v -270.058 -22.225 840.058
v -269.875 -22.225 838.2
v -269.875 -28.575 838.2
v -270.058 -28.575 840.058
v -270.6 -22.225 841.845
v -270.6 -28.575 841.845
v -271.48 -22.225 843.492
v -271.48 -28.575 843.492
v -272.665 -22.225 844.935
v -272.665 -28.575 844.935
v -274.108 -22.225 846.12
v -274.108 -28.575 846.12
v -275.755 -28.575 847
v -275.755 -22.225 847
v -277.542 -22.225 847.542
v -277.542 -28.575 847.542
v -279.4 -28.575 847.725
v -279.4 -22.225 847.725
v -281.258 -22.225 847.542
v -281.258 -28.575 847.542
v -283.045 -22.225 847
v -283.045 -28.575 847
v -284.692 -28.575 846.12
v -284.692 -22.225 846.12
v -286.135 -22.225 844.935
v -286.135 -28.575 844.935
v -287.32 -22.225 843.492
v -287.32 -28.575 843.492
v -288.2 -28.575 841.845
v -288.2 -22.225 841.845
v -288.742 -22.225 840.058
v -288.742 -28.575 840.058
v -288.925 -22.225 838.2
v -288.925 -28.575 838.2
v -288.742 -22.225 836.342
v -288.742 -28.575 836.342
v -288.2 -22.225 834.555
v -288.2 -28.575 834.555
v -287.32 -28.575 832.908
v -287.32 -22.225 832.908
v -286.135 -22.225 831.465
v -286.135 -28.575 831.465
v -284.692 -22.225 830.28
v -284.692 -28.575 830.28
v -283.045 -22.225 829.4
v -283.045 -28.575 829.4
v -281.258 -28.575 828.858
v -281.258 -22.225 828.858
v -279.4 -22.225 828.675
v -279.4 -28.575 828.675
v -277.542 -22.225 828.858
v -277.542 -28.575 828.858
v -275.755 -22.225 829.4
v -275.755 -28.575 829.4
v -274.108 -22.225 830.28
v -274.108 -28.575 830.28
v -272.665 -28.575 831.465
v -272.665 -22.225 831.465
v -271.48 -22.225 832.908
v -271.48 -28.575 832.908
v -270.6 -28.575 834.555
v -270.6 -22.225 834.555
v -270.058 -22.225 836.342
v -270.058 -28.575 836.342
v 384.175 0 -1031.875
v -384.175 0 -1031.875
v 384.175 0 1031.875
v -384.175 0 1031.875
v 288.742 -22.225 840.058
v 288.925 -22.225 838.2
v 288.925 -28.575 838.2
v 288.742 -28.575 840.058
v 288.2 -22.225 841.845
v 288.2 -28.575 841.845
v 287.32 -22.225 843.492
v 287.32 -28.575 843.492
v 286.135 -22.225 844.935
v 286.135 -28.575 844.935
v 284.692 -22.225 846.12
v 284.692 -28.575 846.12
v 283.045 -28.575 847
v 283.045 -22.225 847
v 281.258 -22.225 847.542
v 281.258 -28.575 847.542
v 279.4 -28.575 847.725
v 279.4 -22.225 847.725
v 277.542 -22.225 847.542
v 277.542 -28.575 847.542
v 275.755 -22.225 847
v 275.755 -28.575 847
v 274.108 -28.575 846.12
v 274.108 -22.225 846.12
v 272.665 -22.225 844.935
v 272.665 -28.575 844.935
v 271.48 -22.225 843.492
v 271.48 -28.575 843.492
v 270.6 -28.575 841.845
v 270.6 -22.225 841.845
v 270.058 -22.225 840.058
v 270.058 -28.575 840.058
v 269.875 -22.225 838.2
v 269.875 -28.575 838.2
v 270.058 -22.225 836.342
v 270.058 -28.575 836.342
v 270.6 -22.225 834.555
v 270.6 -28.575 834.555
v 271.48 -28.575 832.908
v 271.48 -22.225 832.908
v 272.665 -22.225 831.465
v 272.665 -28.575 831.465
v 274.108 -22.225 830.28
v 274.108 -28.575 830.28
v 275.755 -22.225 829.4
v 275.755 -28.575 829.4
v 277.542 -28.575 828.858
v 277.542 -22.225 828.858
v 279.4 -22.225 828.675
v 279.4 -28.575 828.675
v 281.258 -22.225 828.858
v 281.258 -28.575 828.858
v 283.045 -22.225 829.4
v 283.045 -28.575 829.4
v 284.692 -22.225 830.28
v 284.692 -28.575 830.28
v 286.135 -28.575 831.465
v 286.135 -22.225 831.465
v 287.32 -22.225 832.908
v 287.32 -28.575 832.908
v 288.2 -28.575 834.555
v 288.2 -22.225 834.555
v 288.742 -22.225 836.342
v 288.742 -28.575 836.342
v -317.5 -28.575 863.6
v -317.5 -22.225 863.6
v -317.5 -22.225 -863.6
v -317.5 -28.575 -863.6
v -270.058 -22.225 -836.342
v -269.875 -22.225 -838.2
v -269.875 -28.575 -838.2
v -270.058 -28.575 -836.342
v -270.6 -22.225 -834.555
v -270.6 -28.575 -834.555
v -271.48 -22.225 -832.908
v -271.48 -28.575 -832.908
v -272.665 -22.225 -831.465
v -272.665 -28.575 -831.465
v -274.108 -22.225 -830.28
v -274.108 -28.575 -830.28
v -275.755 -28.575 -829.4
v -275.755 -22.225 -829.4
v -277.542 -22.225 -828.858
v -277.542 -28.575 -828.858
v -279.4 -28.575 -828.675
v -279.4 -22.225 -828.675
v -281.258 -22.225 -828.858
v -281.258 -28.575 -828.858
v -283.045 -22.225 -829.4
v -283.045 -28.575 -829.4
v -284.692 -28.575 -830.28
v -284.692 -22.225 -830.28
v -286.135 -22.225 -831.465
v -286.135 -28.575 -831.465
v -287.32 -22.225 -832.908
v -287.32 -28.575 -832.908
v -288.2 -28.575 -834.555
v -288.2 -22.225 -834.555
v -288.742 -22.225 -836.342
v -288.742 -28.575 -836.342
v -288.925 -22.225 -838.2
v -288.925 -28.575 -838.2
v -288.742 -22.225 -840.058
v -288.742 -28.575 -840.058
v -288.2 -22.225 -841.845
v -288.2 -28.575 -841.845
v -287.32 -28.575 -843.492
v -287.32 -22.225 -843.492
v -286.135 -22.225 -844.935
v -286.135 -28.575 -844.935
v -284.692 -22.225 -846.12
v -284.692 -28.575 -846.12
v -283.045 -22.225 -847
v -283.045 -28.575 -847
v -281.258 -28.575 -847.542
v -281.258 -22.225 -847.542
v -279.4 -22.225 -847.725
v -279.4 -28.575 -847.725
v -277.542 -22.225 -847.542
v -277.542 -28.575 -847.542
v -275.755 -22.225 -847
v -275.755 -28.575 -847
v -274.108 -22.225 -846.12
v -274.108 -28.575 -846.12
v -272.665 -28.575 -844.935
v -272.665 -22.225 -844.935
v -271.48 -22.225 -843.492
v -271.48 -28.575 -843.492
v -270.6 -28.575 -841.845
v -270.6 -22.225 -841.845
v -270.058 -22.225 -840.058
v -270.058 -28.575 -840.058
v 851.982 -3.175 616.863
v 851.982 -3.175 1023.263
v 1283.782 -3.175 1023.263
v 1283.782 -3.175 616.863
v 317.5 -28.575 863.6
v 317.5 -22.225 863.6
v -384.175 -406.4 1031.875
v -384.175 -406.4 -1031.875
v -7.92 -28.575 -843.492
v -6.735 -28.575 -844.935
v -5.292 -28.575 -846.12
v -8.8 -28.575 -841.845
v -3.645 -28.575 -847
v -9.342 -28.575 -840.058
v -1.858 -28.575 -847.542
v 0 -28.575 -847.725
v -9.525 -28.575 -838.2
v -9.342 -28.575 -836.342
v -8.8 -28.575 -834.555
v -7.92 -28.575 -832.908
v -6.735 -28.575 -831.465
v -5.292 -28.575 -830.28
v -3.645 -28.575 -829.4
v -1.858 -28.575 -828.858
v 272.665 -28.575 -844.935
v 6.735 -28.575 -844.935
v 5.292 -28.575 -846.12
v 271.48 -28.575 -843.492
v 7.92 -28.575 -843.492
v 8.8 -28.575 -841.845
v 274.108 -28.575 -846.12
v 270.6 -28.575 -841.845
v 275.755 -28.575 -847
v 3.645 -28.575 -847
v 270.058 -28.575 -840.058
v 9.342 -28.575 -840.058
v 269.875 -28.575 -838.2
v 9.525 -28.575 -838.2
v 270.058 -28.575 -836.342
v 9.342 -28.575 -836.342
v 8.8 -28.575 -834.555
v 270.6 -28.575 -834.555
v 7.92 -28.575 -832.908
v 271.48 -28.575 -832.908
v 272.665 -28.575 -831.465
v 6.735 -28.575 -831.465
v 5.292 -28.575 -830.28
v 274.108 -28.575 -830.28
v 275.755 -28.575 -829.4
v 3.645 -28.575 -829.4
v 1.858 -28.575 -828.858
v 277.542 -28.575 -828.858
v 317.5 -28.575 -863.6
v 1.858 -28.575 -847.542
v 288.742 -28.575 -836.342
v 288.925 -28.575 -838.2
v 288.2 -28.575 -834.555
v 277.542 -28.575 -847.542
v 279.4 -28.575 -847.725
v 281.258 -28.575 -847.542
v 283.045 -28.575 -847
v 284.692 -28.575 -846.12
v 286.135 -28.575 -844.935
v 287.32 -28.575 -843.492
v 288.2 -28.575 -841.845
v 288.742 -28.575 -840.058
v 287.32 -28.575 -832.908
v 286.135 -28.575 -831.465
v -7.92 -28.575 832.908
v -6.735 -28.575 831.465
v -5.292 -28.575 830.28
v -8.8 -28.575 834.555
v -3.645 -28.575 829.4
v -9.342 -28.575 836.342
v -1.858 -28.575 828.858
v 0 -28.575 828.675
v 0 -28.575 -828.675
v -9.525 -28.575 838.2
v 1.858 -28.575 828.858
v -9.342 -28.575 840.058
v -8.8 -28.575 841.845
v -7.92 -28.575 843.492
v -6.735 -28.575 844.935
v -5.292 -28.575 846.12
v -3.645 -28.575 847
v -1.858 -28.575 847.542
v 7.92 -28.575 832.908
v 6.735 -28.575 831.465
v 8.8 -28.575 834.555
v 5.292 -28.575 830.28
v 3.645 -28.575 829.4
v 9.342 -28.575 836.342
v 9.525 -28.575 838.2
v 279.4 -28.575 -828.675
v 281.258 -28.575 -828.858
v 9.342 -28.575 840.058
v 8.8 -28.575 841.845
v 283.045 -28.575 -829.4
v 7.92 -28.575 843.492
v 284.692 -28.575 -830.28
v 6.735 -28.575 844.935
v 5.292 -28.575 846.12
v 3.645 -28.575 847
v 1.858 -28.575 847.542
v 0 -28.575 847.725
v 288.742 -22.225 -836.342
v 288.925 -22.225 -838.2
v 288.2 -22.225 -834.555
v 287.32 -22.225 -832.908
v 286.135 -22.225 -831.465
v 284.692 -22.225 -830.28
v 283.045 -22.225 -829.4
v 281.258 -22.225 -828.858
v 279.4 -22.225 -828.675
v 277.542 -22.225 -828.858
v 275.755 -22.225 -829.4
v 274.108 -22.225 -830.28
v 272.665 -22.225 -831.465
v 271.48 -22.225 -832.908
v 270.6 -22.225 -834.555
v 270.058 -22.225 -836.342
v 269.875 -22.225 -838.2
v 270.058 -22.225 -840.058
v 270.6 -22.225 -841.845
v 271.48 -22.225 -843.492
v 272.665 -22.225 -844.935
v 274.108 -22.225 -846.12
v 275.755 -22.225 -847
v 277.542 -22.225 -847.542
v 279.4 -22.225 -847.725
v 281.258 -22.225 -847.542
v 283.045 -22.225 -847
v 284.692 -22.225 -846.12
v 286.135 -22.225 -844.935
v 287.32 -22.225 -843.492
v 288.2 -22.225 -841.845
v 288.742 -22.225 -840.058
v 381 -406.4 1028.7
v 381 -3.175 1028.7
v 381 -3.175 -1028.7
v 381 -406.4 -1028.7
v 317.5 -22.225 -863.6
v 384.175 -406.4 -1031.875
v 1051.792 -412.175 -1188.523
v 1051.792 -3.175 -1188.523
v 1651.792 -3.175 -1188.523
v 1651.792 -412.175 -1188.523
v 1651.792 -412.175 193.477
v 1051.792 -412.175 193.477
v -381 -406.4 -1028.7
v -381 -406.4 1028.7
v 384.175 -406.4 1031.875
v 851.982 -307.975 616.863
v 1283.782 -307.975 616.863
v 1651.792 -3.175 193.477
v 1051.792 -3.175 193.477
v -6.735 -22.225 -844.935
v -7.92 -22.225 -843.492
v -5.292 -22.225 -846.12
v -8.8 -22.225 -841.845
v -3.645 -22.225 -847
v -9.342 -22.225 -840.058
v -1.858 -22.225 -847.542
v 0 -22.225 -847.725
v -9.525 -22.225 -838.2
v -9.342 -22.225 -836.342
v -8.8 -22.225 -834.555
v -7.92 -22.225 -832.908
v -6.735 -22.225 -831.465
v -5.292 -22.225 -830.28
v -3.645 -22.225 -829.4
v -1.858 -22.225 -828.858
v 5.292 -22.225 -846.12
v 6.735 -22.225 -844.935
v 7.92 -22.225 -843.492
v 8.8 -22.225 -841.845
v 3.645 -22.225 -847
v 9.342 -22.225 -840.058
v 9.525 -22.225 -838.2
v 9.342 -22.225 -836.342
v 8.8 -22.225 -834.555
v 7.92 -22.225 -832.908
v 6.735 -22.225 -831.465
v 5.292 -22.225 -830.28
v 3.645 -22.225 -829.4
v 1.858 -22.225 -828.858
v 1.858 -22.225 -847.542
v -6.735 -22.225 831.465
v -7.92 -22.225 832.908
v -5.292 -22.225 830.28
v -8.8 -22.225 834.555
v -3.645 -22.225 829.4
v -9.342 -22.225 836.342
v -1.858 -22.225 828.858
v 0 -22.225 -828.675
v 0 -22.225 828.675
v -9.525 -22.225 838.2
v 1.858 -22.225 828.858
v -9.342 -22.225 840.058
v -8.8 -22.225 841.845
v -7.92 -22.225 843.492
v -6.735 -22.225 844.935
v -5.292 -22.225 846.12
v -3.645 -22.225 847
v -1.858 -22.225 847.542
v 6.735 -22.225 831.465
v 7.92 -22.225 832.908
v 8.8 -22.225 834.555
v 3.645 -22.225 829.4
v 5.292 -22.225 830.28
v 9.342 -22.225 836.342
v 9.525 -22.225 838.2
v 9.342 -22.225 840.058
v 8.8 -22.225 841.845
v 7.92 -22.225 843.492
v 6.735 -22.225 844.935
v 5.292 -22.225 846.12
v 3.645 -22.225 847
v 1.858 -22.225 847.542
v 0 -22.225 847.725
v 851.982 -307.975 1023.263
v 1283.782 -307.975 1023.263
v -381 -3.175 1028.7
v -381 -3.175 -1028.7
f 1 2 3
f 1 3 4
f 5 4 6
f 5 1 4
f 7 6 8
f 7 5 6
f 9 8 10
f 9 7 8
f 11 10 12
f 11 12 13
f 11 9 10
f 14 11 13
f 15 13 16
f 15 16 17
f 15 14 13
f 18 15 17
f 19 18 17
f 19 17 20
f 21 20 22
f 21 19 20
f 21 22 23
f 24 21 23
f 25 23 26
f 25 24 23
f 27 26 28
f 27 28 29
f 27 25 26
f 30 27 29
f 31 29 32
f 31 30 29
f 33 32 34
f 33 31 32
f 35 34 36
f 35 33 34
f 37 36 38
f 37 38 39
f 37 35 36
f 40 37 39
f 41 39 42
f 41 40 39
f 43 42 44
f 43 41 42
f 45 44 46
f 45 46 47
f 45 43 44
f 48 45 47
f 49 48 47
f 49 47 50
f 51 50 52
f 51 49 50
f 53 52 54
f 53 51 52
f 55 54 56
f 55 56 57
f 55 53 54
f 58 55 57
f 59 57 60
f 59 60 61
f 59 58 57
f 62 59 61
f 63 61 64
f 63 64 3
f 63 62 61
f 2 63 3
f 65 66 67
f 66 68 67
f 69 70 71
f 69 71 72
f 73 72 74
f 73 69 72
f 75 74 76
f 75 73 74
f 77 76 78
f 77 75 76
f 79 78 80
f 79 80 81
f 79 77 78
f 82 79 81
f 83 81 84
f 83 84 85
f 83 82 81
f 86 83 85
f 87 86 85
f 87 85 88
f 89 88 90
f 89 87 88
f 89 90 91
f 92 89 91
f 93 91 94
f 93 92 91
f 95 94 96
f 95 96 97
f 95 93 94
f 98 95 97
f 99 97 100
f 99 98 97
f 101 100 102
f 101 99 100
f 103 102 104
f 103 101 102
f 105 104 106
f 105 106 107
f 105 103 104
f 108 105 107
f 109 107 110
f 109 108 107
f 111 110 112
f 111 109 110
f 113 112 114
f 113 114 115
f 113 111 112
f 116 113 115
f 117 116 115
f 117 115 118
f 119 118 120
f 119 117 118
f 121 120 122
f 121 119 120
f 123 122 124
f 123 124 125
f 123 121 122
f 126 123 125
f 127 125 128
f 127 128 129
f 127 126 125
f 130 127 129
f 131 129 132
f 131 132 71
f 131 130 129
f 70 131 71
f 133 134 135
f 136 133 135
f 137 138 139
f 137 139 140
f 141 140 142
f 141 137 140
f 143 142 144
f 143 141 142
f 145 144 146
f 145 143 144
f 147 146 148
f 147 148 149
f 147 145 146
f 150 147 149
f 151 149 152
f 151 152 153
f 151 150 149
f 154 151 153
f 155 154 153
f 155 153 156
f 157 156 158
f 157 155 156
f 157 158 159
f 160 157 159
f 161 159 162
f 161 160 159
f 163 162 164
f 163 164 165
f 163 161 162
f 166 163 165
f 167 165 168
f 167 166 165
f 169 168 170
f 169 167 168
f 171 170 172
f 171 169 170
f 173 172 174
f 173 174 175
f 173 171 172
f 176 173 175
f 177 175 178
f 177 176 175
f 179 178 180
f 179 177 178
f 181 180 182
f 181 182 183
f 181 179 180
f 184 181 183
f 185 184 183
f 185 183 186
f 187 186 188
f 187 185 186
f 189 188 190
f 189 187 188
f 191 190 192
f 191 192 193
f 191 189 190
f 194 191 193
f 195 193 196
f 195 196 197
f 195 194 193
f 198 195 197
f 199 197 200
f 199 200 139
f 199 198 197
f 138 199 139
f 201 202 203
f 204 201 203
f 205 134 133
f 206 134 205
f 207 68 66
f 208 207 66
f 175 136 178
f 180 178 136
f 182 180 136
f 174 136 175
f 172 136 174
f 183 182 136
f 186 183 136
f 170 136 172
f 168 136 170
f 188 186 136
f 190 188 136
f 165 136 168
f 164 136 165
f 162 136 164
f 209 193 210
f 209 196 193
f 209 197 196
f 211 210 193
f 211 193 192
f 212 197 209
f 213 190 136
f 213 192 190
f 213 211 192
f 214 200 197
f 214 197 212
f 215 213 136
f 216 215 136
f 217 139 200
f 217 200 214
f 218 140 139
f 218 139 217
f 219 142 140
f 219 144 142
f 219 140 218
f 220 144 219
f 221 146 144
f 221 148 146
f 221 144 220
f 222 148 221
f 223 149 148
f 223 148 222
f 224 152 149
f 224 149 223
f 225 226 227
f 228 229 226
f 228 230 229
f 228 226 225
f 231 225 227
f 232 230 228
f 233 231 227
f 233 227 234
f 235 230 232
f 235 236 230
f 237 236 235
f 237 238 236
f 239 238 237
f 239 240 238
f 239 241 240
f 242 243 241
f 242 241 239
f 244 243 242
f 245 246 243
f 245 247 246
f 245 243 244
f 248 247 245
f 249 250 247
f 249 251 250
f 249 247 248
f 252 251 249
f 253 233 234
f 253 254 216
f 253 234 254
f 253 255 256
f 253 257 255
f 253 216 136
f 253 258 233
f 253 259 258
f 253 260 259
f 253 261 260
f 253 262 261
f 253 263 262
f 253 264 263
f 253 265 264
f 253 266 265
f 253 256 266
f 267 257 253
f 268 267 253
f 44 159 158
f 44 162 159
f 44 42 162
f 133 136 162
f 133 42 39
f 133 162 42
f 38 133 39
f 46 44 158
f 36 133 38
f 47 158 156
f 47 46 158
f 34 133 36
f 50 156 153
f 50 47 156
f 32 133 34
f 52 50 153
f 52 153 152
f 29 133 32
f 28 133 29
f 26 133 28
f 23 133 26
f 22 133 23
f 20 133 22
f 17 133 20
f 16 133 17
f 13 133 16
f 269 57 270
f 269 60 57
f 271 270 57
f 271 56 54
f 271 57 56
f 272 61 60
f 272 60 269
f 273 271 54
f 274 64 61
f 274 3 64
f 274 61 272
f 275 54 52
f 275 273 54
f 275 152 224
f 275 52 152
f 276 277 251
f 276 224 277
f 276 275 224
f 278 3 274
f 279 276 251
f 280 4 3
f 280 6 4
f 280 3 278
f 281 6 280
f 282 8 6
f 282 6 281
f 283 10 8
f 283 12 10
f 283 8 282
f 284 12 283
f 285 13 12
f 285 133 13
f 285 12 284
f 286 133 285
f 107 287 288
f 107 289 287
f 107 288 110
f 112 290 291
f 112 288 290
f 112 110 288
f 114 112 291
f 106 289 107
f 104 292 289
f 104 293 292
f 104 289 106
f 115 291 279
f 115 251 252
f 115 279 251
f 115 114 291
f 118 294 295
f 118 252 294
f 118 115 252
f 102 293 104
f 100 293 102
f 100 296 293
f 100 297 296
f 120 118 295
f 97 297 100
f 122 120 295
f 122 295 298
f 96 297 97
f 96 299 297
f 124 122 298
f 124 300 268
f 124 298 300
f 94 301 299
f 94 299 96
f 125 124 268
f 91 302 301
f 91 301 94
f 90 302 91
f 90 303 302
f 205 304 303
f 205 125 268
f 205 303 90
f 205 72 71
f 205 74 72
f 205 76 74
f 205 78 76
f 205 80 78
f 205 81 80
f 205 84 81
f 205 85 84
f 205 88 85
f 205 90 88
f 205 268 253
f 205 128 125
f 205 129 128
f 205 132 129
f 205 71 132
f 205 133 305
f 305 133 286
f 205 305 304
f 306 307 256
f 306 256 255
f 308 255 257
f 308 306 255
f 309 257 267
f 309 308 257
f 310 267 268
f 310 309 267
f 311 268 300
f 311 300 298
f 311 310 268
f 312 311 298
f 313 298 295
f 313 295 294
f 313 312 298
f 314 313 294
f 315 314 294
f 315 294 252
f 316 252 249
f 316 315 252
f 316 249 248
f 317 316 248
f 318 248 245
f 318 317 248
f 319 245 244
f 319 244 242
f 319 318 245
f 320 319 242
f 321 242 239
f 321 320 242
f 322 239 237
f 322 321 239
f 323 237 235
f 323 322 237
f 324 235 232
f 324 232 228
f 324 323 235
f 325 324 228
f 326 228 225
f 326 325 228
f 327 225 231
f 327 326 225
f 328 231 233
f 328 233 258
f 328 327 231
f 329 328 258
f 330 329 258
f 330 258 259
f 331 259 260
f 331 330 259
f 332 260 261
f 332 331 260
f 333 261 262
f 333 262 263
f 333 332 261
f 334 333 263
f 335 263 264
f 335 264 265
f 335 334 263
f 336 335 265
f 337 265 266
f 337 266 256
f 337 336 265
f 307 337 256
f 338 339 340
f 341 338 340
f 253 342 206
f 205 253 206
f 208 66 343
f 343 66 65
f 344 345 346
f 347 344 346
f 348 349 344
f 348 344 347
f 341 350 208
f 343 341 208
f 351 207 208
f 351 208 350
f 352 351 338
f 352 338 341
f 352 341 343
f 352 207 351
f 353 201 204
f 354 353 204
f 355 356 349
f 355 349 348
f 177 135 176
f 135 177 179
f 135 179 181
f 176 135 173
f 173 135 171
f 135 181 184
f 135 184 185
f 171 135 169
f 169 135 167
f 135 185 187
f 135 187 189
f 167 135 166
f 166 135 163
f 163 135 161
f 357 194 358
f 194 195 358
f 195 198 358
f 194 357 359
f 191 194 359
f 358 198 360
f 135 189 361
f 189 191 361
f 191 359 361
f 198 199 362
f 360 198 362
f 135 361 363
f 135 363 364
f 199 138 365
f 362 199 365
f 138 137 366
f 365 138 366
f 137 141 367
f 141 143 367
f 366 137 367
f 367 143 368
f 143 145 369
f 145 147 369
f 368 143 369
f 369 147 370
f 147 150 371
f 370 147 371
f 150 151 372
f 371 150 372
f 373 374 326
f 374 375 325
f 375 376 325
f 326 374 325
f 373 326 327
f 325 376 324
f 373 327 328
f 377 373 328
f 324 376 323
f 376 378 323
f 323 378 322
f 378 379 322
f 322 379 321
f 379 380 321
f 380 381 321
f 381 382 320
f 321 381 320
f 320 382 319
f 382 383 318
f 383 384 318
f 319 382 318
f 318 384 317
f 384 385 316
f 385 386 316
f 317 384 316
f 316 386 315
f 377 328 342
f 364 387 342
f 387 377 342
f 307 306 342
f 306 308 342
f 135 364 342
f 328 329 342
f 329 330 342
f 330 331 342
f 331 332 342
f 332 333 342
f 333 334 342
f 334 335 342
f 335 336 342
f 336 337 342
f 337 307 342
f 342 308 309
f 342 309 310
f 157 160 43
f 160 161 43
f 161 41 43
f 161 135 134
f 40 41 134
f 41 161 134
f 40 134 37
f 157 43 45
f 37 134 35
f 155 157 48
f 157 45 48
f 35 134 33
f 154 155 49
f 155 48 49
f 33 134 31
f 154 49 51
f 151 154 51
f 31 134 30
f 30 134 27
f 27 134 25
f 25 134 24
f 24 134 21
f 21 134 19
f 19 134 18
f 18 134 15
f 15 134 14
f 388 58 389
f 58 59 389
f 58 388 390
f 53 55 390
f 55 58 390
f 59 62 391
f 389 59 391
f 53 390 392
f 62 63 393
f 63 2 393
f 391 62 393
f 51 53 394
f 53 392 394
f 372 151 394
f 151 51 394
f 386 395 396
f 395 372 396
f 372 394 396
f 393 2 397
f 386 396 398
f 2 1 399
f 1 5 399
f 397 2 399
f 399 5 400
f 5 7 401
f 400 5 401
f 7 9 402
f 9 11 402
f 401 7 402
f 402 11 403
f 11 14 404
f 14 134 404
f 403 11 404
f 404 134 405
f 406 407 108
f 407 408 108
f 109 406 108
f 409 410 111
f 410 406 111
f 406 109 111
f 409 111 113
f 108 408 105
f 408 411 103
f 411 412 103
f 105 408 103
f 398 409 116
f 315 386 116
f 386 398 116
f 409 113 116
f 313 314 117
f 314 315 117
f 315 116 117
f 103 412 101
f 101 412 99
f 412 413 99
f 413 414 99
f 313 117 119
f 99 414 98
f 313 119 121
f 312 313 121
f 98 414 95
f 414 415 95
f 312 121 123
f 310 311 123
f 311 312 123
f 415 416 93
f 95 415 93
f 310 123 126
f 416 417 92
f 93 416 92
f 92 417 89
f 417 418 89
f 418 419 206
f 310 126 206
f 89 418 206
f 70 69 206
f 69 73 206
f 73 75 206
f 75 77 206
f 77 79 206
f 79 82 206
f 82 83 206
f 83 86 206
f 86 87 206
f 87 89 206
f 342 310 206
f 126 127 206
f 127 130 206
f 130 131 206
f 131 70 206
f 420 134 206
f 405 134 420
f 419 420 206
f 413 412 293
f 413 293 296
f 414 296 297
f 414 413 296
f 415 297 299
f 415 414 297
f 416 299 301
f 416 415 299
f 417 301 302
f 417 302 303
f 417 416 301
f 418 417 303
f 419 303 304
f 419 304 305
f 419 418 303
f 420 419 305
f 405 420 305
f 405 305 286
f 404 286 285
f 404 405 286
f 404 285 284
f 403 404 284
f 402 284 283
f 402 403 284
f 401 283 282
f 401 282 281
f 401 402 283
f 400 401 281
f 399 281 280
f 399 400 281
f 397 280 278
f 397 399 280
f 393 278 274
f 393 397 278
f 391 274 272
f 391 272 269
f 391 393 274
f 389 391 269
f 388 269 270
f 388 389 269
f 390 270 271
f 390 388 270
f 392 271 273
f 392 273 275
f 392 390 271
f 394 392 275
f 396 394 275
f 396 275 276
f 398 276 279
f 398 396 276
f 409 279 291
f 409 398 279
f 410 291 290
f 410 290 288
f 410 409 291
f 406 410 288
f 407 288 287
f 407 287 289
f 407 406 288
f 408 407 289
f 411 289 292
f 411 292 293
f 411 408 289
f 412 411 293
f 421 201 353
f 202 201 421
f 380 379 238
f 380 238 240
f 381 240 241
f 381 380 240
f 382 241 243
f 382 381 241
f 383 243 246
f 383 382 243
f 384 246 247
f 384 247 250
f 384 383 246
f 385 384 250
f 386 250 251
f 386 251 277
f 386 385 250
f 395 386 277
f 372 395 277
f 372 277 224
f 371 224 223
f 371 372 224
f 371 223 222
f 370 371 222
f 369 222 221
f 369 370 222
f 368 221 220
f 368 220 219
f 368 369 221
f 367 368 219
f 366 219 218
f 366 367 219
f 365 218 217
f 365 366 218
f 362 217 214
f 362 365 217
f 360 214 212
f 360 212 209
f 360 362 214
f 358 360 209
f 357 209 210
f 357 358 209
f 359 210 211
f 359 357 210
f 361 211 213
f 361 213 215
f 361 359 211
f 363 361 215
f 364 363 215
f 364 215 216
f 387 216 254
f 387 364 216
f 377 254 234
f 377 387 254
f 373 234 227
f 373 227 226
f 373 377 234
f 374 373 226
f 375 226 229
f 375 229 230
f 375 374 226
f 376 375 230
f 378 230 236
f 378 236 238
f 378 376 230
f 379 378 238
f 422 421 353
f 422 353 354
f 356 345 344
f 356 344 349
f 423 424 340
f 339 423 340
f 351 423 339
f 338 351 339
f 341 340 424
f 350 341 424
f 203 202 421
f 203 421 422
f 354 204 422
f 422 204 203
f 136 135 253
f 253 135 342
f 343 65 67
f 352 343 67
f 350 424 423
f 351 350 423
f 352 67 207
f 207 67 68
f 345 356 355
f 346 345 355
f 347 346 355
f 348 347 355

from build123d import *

# Parameters (mm, degrees)
F0_W     = 762
F0_H     = 3.175
F0_H_2   = 2057.4
F1_DEPTH = 3.175
F2_DEPTH = 406.4
F4_START = 19.05
F3_W     = 635
F3_H     = 101.6
F3_R     = 9.525
F3_H_2   = 1562.1
F3_H_3   = 63.5
F4_DEPTH = 6.35
F3_W_2   = 431.8
F3_H_4   = 406.4
F5_DEPTH = 304.8
F3_W_3   = 600
F3_H_5   = 1382
F6_DEPTH = 409


# Not quite as in the source:
# - a length typed as a fraction of an inch, garbled in the dataset ("3 / 203.2 mm" for 3/8 in), is restored


with BuildPart() as f1:
    # F0 (on Front) → F1 (new body)
    with BuildSketch(Plane.XZ):
        Polygon((381, -1028.7), (-381, -1028.7), (-384.175, -1028.7), (-384.175, -1031.875), (384.175, -1031.875), (384.175, -1028.7), align=None)
        Polygon((-381, -1028.7), (-381, 1028.7), (-381, 1031.875), (-384.175, 1031.875), (-384.175, -1028.7), align=None)
        Polygon((381, 1031.875), (381, 1028.7), (381, -1028.7), (384.175, -1028.7), (384.175, 1031.875), align=None)
        with Locations((0, 1030.2875)):
            Rectangle(F0_W, F0_H)
        Rectangle(F0_W, F0_H_2)
    extrude(amount=F1_DEPTH)

    # F0 (on Front) → F2 (join)
    with BuildSketch(Plane.XZ):
        Polygon((-381, -1028.7), (-381, 1028.7), (-381, 1031.875), (-384.175, 1031.875), (-384.175, -1028.7), align=None)
        with Locations((0, 1030.2875)):
            Rectangle(F0_W, F0_H)
        Polygon((381, 1031.875), (381, 1028.7), (381, -1028.7), (384.175, -1028.7), (384.175, 1031.875), align=None)
        Polygon((381, -1028.7), (-381, -1028.7), (-384.175, -1028.7), (-384.175, -1031.875), (384.175, -1031.875), (384.175, -1028.7), align=None)
    extrude(amount=F2_DEPTH)


with BuildPart() as f4:
    # F3 (on face) → F4 (new body)
    with BuildSketch(Plane.XZ.offset(3.175).offset(F4_START)):
        with Locations((0, 812.8)):
            Rectangle(F3_W, F3_H)
        with Locations((-279.4, 838.2)):
            Circle(F3_R, mode=Mode.SUBTRACT)
        with Locations((0, 838.2)):
            Circle(F3_R, mode=Mode.SUBTRACT)
        with Locations((279.4, 838.2)):
            Circle(F3_R, mode=Mode.SUBTRACT)
        with Locations((0, -19.05)):
            Rectangle(F3_W, F3_H_2)
        with Locations((0, -831.85)):
            Rectangle(F3_W, F3_H_3)
        with Locations((-279.4, -838.2)):
            Circle(F3_R, mode=Mode.SUBTRACT)
        with Locations((0, -838.2)):
            Circle(F3_R, mode=Mode.SUBTRACT)
        with Locations((279.4, -838.2)):
            Circle(F3_R, mode=Mode.SUBTRACT)
    extrude(amount=F4_DEPTH)


with BuildPart() as f5:
    # F3 (on face) → F5 (new body)
    with BuildSketch(Plane.XZ.offset(3.175)):
        with Locations((1067.8818782806, 820.0628931046)):
            Rectangle(F3_W_2, F3_H_4)
    extrude(amount=F5_DEPTH)


with BuildPart() as f6:
    # F3 (on face) → F6 (new body)
    with BuildSketch(Plane.XZ.offset(3.175)):
        with Locations((1351.792383194, -497.5234422684)):
            Rectangle(F3_W_3, F3_H_5)
    extrude(amount=F6_DEPTH)


solid = Compound([f1.part, f4.part, f5.part, f6.part])
